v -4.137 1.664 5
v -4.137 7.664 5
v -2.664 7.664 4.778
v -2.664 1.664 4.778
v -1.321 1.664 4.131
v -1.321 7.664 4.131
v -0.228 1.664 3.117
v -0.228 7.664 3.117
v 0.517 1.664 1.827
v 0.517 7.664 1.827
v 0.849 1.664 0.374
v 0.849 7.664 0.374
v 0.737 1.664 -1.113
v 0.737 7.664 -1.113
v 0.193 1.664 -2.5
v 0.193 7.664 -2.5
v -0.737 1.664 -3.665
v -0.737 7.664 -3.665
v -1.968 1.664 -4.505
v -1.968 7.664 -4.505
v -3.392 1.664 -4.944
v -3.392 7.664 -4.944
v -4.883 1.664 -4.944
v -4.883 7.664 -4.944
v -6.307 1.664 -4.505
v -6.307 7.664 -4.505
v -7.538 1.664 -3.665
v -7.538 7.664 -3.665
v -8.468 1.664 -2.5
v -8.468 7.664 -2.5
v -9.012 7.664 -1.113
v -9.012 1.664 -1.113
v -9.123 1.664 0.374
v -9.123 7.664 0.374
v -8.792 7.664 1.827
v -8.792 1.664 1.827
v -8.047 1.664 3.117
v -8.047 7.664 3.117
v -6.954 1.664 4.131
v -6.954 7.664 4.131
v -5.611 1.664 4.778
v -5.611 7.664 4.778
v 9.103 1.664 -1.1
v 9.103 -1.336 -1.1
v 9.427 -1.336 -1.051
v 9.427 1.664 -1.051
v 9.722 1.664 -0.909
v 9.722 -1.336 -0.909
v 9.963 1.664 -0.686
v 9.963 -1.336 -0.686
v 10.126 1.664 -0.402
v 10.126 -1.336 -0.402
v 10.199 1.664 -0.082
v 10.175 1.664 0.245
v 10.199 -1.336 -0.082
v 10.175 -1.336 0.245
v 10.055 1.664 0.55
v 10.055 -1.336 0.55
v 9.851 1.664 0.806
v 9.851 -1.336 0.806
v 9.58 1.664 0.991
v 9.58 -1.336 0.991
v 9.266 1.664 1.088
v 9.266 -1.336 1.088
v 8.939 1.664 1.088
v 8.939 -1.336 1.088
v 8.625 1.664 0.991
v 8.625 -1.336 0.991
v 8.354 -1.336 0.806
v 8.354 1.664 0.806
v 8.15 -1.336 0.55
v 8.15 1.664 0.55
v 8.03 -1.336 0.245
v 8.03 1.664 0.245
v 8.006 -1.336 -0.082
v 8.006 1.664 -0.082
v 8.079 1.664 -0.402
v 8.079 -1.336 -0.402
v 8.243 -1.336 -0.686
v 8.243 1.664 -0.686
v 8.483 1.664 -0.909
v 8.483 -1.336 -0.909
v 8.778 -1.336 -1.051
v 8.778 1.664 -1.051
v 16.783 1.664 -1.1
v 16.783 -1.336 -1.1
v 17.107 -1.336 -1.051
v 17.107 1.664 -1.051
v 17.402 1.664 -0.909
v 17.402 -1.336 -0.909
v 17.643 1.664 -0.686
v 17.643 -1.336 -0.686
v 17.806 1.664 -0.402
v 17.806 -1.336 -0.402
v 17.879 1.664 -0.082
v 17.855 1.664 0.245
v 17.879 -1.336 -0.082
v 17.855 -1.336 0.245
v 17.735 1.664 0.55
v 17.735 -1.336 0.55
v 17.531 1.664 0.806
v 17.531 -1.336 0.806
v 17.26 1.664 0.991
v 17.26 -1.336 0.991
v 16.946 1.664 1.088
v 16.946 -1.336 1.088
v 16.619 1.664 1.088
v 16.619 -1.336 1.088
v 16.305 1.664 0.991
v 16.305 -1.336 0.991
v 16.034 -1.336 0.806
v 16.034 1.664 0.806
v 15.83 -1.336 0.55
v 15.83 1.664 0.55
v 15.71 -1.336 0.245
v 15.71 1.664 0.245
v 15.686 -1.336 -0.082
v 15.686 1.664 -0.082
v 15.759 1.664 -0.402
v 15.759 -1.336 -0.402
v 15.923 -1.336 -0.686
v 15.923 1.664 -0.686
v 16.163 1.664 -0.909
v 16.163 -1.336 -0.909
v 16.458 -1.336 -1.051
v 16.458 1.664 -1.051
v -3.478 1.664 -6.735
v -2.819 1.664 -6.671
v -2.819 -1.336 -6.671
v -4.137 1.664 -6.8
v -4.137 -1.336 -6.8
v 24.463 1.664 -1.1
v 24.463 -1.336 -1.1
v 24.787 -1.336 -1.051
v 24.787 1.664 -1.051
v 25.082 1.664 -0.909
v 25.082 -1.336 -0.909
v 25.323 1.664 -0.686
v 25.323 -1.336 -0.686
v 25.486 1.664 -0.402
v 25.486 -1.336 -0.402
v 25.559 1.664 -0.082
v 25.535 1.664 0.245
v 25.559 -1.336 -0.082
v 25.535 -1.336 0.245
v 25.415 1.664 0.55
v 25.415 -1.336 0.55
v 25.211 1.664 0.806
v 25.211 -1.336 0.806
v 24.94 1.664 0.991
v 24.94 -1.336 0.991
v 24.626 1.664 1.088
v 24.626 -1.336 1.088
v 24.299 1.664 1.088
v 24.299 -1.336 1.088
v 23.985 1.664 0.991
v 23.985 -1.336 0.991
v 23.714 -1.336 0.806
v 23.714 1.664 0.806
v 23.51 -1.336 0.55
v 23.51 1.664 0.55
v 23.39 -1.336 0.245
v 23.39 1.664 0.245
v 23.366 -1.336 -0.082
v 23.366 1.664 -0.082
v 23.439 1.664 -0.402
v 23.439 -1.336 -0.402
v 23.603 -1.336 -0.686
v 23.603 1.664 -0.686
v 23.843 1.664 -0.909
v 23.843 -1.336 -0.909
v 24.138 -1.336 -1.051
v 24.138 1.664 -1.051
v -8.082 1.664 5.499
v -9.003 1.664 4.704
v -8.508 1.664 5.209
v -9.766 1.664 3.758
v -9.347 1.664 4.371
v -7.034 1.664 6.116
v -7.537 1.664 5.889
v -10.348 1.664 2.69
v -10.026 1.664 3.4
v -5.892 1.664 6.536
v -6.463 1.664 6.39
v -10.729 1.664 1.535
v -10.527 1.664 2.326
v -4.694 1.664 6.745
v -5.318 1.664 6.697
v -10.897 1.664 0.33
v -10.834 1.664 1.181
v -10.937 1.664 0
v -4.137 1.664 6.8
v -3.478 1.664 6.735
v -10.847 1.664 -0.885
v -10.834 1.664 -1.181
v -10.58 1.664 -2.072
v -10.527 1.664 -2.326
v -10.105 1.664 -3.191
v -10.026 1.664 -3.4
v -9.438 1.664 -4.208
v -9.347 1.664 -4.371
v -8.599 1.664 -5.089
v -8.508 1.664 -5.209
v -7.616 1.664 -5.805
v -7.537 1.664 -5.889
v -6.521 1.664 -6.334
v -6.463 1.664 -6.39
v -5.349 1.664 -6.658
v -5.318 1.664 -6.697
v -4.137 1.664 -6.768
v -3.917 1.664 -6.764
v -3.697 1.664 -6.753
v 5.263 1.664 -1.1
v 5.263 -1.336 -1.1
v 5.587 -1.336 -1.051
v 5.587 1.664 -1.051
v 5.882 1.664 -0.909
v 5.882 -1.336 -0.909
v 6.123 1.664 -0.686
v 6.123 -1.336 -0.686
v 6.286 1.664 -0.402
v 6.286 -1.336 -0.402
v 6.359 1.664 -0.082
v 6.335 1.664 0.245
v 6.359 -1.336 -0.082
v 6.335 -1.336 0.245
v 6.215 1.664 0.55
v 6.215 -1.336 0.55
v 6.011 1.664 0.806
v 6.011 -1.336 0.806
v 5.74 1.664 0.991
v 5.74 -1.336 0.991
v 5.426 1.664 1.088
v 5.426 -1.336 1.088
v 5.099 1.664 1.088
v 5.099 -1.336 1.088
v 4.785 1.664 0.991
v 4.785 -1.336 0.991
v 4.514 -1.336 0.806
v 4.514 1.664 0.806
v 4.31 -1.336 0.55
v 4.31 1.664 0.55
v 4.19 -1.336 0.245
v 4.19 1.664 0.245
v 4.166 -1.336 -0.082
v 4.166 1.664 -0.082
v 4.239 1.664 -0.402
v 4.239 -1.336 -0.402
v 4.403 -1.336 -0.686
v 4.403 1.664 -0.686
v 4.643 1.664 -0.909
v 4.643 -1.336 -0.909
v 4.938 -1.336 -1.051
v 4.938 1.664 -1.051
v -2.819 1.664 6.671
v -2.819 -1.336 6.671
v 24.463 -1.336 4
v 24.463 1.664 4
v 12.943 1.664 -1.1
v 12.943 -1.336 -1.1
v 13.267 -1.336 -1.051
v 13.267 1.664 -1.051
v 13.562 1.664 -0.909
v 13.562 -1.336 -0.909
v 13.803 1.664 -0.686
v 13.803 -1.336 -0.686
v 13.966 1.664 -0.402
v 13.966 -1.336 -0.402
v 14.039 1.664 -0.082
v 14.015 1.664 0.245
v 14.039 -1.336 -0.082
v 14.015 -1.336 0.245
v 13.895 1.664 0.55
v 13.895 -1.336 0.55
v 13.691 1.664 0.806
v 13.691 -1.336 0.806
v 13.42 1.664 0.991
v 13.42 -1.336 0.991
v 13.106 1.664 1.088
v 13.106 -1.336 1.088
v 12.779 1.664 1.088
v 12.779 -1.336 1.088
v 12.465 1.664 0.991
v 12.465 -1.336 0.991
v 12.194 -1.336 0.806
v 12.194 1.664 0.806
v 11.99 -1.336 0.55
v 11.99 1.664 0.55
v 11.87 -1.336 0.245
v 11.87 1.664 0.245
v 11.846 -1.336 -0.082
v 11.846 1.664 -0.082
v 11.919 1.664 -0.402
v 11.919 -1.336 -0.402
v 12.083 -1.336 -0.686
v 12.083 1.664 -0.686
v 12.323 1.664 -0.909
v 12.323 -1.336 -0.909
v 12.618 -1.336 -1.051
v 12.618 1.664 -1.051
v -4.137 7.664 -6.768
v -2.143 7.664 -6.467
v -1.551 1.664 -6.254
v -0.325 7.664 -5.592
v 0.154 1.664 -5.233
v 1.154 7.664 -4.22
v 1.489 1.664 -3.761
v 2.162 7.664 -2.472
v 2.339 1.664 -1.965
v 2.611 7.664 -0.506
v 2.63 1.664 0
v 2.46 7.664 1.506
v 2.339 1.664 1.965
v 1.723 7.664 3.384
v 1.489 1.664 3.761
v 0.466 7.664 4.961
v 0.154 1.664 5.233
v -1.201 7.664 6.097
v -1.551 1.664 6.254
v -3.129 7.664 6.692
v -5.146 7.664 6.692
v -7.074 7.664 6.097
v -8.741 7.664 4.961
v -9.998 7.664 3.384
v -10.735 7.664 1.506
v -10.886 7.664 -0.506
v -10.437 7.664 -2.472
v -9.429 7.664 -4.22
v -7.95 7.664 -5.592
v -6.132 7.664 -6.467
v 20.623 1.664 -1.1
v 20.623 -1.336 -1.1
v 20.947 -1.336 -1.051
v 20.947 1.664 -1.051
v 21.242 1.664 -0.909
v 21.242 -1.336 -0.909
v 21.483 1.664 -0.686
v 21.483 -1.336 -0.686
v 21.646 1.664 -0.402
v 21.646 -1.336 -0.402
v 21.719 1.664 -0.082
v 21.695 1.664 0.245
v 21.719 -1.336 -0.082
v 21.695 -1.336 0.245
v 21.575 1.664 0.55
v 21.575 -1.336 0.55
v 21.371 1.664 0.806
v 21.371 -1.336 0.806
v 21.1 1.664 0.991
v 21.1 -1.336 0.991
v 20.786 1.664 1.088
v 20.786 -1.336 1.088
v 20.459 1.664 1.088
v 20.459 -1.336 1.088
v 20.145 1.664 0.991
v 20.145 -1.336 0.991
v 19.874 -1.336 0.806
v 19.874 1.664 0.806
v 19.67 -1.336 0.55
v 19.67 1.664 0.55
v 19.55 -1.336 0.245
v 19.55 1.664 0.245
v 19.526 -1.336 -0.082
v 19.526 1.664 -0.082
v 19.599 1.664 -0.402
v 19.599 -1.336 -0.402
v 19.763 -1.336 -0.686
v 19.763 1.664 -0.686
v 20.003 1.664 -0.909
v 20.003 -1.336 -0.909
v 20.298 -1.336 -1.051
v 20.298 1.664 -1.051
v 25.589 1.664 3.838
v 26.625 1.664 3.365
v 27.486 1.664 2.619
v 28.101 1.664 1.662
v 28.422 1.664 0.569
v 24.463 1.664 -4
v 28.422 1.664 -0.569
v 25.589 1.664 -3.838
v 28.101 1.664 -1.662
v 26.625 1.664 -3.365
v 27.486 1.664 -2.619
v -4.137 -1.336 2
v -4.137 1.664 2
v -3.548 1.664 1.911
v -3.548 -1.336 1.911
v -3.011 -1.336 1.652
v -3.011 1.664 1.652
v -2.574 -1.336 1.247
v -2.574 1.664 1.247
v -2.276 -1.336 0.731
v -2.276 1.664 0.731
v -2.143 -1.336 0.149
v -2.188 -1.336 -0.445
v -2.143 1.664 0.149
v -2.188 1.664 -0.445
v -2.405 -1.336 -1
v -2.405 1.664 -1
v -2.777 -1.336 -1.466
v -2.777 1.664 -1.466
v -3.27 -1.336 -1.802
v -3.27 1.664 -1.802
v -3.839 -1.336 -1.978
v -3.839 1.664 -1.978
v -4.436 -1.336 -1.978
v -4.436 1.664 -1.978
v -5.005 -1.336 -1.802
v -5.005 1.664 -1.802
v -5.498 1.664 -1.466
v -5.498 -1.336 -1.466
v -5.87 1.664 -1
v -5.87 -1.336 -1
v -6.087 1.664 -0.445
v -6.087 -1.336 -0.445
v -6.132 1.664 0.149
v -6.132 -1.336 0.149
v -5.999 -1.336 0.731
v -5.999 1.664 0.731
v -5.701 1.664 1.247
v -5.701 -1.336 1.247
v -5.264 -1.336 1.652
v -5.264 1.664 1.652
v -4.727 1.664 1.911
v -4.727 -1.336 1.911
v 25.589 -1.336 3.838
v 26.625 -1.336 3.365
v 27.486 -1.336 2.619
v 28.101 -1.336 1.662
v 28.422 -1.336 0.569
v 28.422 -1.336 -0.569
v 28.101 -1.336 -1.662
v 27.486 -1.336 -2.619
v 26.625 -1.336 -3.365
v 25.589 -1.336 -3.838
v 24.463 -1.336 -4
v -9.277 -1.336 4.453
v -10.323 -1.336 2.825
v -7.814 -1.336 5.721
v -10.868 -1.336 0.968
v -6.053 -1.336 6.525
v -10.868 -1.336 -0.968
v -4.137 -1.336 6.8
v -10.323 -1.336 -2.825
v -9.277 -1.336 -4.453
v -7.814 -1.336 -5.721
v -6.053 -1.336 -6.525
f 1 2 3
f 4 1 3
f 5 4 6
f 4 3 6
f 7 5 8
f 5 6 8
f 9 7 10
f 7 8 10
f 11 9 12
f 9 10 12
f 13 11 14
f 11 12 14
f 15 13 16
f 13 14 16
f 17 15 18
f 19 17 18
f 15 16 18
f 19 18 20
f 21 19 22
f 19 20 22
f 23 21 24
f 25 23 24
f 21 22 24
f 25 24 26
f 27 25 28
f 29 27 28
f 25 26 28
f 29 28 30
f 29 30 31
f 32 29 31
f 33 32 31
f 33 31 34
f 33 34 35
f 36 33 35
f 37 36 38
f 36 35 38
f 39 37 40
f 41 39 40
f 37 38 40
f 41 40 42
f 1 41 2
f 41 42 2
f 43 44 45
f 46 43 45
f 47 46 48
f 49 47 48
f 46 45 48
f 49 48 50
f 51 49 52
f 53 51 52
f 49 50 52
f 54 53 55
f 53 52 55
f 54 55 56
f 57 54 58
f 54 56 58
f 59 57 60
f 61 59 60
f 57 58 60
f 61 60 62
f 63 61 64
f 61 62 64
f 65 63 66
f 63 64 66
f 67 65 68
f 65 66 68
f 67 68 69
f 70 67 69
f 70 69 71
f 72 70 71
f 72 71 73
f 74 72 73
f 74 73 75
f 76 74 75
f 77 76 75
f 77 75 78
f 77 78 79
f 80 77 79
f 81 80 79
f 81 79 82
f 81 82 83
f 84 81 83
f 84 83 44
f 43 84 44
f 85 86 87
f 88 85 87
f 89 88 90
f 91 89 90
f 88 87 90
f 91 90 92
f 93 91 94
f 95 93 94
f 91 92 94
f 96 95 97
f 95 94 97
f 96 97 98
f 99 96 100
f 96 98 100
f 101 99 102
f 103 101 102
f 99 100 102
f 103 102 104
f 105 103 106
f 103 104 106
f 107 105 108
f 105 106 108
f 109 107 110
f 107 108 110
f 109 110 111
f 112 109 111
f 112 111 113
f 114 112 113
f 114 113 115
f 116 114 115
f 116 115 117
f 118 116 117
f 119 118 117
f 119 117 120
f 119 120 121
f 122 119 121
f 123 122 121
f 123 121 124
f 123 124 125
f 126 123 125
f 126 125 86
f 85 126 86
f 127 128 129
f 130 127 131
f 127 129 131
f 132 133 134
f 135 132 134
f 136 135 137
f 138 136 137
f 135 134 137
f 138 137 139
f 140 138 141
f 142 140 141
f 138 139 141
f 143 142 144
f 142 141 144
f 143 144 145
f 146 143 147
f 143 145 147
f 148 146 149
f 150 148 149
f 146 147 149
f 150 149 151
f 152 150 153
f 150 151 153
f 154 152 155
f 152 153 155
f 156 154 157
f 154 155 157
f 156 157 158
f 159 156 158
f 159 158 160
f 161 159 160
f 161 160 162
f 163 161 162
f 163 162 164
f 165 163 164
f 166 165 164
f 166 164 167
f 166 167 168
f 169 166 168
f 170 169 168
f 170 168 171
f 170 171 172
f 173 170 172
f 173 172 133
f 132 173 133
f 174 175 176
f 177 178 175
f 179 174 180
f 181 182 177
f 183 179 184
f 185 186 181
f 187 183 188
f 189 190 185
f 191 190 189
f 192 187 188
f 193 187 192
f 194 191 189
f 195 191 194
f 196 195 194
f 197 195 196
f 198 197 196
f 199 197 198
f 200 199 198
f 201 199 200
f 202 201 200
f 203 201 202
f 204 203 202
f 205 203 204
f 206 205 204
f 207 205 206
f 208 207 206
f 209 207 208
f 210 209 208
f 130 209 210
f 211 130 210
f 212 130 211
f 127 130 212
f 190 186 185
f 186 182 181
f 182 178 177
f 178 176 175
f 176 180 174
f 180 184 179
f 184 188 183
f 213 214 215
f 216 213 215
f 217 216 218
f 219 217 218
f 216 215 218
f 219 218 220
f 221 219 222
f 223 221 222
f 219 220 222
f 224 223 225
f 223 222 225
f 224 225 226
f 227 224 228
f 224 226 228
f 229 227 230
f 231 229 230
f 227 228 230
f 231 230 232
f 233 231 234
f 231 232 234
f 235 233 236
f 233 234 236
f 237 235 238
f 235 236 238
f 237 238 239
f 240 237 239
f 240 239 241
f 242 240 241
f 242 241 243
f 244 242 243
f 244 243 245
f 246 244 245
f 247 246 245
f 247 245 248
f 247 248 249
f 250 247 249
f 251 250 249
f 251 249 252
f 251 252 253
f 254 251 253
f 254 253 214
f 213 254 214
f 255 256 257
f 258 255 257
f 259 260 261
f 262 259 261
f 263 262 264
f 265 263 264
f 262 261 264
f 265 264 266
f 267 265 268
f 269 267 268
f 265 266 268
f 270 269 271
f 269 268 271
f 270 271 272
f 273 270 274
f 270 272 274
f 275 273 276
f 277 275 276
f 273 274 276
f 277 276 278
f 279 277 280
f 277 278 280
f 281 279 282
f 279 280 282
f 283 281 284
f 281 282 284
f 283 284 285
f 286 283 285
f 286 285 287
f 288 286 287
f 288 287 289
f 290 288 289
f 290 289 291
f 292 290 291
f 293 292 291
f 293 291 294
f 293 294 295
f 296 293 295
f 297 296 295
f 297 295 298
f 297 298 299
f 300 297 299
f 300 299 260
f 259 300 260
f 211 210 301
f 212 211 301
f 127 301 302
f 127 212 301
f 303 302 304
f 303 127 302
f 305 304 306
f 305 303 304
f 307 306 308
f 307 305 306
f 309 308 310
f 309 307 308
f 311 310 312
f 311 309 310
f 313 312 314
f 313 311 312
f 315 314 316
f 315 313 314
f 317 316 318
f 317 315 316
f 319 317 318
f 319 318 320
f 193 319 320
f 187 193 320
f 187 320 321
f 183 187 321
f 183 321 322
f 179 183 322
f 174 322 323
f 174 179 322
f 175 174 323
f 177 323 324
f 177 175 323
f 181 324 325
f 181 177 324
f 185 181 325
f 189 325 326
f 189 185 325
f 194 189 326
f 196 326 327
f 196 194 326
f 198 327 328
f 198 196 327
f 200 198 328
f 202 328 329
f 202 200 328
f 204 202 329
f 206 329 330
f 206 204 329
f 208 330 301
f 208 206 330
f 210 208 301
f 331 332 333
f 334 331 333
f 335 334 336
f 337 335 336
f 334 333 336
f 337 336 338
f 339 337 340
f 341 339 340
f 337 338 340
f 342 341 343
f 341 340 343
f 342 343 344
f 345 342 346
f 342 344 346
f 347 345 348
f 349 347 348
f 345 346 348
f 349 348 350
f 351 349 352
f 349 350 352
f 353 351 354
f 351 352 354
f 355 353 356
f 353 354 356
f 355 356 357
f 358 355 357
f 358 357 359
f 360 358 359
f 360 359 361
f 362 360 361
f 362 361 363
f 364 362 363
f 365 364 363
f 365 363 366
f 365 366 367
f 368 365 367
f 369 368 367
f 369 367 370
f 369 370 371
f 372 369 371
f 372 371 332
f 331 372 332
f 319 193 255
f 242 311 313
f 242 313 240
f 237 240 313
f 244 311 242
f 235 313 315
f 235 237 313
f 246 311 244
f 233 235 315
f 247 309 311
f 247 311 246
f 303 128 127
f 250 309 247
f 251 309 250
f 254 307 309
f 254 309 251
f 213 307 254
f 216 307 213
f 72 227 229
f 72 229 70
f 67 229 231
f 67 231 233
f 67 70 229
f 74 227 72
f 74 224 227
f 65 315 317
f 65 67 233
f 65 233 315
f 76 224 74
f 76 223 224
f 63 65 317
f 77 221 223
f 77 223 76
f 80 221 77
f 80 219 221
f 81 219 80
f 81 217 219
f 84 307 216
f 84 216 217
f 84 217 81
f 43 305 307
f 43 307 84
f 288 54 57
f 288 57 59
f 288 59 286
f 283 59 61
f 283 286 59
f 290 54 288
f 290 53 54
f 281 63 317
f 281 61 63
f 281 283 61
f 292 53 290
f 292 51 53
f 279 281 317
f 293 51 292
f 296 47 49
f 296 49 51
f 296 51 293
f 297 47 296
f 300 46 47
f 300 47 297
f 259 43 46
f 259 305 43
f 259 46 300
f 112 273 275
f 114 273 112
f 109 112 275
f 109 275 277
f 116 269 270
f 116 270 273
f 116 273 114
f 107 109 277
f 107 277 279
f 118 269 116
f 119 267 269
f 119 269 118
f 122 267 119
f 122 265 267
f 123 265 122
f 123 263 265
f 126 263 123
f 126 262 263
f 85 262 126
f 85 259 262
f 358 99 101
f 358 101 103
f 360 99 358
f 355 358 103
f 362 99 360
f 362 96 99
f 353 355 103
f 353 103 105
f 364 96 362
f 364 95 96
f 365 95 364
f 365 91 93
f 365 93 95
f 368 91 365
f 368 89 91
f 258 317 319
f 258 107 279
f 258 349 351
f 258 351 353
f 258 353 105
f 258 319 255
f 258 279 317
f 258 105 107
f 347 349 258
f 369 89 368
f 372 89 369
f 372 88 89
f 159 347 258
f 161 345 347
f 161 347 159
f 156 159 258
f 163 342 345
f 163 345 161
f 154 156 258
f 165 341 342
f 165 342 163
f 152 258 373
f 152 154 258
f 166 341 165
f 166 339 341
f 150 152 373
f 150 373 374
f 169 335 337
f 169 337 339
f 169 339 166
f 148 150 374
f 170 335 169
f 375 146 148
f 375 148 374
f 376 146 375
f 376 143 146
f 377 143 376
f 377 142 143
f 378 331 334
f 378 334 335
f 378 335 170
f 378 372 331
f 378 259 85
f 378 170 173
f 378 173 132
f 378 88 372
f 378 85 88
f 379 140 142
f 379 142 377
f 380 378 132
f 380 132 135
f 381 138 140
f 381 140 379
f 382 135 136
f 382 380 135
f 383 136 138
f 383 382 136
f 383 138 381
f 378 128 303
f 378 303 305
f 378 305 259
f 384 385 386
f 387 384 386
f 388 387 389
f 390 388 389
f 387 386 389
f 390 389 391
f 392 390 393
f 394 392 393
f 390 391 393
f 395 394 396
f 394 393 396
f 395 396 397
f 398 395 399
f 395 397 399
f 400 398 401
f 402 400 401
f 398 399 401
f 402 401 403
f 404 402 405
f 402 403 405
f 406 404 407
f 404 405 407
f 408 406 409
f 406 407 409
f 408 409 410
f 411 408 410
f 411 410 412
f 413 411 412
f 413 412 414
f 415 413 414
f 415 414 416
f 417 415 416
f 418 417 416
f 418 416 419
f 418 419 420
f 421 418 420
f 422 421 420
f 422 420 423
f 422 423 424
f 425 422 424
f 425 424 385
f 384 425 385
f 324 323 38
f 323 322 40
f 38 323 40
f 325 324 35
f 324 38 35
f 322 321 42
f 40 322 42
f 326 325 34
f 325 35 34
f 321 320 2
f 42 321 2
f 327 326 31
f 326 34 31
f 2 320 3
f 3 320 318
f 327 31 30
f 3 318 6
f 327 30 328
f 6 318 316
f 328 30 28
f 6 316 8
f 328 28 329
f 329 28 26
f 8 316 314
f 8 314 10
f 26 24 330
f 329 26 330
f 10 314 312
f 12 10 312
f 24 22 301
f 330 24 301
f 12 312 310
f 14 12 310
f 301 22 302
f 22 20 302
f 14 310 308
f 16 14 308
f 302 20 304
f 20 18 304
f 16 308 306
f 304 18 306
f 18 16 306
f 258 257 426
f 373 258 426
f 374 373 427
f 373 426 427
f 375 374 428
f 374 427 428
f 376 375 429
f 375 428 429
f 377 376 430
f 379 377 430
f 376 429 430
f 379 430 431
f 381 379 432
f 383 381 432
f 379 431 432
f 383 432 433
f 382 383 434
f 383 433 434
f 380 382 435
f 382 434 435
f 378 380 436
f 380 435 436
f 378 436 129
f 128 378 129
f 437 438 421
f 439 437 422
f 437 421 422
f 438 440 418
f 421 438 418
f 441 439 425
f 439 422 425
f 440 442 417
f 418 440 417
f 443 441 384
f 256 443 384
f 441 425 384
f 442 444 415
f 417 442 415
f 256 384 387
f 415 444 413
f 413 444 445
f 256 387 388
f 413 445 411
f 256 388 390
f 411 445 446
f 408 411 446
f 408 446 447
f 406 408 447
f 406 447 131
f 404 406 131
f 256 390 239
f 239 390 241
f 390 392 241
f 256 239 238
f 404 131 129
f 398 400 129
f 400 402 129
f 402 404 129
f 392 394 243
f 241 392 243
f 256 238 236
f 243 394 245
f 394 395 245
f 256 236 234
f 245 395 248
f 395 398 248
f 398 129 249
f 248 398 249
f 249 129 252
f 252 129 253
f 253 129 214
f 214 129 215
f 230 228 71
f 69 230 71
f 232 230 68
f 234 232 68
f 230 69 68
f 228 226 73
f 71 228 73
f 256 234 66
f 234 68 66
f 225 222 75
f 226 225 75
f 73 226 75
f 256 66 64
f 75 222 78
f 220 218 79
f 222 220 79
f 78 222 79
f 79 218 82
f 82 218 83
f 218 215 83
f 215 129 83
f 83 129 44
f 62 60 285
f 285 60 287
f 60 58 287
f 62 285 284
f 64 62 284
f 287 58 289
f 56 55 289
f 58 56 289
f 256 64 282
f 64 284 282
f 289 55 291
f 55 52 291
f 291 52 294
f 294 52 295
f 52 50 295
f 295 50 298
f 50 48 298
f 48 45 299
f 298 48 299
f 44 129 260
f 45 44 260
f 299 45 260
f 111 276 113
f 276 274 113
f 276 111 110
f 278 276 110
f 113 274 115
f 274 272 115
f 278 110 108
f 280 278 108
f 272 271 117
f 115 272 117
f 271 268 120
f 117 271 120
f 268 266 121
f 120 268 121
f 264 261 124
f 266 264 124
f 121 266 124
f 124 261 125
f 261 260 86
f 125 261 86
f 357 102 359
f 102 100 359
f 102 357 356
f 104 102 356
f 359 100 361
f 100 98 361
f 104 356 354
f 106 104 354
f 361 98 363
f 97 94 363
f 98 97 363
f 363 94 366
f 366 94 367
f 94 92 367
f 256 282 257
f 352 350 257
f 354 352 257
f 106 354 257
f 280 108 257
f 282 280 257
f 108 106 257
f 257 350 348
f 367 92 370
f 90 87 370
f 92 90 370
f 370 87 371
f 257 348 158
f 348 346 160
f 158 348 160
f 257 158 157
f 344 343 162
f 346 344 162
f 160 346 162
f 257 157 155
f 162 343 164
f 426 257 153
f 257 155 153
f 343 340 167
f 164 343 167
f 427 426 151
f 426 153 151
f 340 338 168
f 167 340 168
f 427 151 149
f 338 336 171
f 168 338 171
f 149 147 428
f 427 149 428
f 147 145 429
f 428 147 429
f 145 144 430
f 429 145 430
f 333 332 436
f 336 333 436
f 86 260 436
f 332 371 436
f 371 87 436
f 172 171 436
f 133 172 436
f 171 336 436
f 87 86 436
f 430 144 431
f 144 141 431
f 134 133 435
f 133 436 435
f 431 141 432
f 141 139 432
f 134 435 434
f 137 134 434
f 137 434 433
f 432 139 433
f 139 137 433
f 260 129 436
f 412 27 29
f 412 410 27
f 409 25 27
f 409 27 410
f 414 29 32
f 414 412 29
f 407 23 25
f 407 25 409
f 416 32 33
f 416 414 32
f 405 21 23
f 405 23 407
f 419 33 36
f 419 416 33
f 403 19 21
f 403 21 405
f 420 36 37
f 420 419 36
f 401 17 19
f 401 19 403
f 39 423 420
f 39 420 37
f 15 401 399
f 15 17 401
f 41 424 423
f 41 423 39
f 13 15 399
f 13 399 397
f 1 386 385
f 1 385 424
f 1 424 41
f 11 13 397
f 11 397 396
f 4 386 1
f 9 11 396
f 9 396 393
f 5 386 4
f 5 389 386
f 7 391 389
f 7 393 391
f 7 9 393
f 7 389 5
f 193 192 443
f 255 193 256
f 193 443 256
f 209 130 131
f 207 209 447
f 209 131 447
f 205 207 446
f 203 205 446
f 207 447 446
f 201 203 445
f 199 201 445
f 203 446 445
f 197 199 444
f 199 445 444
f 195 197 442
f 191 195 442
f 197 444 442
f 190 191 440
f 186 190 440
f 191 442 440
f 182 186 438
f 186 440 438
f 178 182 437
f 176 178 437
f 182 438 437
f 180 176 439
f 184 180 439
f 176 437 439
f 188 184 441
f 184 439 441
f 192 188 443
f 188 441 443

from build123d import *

# Parameters (mm, degrees)
BOSS_EXTRUDE1_DEPTH = 1.5
SKETCH2_R           = 3.38382201
BOSS_EXTRUDE2_DEPTH = 4.5
SKETCH3_R           = 2.5
CUT_EXTRUDE1_DEPTH  = 3
SKETCH4_R           = 1
CUT_EXTRUDE2_DEPTH  = 3.5
SKETCH5_R           = 0.55
CUT_EXTRUDE3_DEPTH  = 3.5
SCALE1_SCALE        = 2


with BuildPart() as part:
    # Sketch1 → Boss-Extrude1 (new body)
    with BuildSketch(Plane(origin=(0, 0, 0), x_dir=(1, 0, 0), z_dir=(0, 1, 0))):
        with BuildLine():
            Line((0.659413902, 3.335441996), (0, 3.4))
            ThreePointArc((0, 3.4), (-3.4, 0), (0, -3.4))
            Line((0, -3.4), (0.659413902, -3.335441996))
            Line((0.659413902, -3.335441996), (14.3, -2))
            ThreePointArc((14.3, -2), (16.3, 0), (14.3, 2))
            Line((14.3, 2), (0.659413902, 3.335441996))
        make_face()
    extrude(amount=BOSS_EXTRUDE1_DEPTH)

    # Sketch2 → Boss-Extrude2 (add)
    with BuildSketch(Plane.XZ):
        with Locations(Location((0, 0, 0), (0, 0, 270))):
            Circle(SKETCH2_R)
    extrude(amount=-BOSS_EXTRUDE2_DEPTH)

    # Sketch3 → Cut-Extrude1 (cut)
    with BuildSketch(Plane(origin=(0, 4.5, 0), x_dir=(1, 0, 0), z_dir=(0, 1, 0))):
        with Locations(Location((0, 0, 0), (0, 0, 270))):
            Circle(SKETCH3_R)
    extrude(amount=-CUT_EXTRUDE1_DEPTH, mode=Mode.SUBTRACT)

    # Sketch4 → Cut-Extrude2 (cut)
    with BuildSketch(Plane(origin=(0, 1.5, 0), x_dir=(1, 0, 0), z_dir=(0, 1, 0))):
        with Locations(Location((0, 0, 0), (0, 0, 270))):
            Circle(SKETCH4_R)
    extrude(amount=-CUT_EXTRUDE2_DEPTH, mode=Mode.SUBTRACT)

    # Sketch5 → Cut-Extrude3 (cut)
    with BuildSketch(Plane.XZ):
        with Locations(Location((14.3, 0, 0), (0, 0, 270))):
            Circle(SKETCH5_R)
        with Locations(Location((12.38, 0, 0), (0, 0, 270))):
            Circle(SKETCH5_R)
        with Locations(Location((10.46, 0, 0), (0, 0, 270))):
            Circle(SKETCH5_R)
        with Locations(Location((8.54, 0, 0), (0, 0, 270))):
            Circle(SKETCH5_R)
        with Locations(Location((6.62, 0, 0), (0, 0, 270))):
            Circle(SKETCH5_R)
        with Locations(Location((4.7, 0, 0), (0, 0, 270))):
            Circle(SKETCH5_R)
    extrude(amount=-CUT_EXTRUDE3_DEPTH, mode=Mode.SUBTRACT)


with BuildPart() as part_1:
    # Scale1: scaled about (4.137469707, 1.335828051, 0)
    add(part.part.scale(SCALE1_SCALE).moved(Location((-4.137469707, -1.335828051, 0))))


solid = part_1.part
